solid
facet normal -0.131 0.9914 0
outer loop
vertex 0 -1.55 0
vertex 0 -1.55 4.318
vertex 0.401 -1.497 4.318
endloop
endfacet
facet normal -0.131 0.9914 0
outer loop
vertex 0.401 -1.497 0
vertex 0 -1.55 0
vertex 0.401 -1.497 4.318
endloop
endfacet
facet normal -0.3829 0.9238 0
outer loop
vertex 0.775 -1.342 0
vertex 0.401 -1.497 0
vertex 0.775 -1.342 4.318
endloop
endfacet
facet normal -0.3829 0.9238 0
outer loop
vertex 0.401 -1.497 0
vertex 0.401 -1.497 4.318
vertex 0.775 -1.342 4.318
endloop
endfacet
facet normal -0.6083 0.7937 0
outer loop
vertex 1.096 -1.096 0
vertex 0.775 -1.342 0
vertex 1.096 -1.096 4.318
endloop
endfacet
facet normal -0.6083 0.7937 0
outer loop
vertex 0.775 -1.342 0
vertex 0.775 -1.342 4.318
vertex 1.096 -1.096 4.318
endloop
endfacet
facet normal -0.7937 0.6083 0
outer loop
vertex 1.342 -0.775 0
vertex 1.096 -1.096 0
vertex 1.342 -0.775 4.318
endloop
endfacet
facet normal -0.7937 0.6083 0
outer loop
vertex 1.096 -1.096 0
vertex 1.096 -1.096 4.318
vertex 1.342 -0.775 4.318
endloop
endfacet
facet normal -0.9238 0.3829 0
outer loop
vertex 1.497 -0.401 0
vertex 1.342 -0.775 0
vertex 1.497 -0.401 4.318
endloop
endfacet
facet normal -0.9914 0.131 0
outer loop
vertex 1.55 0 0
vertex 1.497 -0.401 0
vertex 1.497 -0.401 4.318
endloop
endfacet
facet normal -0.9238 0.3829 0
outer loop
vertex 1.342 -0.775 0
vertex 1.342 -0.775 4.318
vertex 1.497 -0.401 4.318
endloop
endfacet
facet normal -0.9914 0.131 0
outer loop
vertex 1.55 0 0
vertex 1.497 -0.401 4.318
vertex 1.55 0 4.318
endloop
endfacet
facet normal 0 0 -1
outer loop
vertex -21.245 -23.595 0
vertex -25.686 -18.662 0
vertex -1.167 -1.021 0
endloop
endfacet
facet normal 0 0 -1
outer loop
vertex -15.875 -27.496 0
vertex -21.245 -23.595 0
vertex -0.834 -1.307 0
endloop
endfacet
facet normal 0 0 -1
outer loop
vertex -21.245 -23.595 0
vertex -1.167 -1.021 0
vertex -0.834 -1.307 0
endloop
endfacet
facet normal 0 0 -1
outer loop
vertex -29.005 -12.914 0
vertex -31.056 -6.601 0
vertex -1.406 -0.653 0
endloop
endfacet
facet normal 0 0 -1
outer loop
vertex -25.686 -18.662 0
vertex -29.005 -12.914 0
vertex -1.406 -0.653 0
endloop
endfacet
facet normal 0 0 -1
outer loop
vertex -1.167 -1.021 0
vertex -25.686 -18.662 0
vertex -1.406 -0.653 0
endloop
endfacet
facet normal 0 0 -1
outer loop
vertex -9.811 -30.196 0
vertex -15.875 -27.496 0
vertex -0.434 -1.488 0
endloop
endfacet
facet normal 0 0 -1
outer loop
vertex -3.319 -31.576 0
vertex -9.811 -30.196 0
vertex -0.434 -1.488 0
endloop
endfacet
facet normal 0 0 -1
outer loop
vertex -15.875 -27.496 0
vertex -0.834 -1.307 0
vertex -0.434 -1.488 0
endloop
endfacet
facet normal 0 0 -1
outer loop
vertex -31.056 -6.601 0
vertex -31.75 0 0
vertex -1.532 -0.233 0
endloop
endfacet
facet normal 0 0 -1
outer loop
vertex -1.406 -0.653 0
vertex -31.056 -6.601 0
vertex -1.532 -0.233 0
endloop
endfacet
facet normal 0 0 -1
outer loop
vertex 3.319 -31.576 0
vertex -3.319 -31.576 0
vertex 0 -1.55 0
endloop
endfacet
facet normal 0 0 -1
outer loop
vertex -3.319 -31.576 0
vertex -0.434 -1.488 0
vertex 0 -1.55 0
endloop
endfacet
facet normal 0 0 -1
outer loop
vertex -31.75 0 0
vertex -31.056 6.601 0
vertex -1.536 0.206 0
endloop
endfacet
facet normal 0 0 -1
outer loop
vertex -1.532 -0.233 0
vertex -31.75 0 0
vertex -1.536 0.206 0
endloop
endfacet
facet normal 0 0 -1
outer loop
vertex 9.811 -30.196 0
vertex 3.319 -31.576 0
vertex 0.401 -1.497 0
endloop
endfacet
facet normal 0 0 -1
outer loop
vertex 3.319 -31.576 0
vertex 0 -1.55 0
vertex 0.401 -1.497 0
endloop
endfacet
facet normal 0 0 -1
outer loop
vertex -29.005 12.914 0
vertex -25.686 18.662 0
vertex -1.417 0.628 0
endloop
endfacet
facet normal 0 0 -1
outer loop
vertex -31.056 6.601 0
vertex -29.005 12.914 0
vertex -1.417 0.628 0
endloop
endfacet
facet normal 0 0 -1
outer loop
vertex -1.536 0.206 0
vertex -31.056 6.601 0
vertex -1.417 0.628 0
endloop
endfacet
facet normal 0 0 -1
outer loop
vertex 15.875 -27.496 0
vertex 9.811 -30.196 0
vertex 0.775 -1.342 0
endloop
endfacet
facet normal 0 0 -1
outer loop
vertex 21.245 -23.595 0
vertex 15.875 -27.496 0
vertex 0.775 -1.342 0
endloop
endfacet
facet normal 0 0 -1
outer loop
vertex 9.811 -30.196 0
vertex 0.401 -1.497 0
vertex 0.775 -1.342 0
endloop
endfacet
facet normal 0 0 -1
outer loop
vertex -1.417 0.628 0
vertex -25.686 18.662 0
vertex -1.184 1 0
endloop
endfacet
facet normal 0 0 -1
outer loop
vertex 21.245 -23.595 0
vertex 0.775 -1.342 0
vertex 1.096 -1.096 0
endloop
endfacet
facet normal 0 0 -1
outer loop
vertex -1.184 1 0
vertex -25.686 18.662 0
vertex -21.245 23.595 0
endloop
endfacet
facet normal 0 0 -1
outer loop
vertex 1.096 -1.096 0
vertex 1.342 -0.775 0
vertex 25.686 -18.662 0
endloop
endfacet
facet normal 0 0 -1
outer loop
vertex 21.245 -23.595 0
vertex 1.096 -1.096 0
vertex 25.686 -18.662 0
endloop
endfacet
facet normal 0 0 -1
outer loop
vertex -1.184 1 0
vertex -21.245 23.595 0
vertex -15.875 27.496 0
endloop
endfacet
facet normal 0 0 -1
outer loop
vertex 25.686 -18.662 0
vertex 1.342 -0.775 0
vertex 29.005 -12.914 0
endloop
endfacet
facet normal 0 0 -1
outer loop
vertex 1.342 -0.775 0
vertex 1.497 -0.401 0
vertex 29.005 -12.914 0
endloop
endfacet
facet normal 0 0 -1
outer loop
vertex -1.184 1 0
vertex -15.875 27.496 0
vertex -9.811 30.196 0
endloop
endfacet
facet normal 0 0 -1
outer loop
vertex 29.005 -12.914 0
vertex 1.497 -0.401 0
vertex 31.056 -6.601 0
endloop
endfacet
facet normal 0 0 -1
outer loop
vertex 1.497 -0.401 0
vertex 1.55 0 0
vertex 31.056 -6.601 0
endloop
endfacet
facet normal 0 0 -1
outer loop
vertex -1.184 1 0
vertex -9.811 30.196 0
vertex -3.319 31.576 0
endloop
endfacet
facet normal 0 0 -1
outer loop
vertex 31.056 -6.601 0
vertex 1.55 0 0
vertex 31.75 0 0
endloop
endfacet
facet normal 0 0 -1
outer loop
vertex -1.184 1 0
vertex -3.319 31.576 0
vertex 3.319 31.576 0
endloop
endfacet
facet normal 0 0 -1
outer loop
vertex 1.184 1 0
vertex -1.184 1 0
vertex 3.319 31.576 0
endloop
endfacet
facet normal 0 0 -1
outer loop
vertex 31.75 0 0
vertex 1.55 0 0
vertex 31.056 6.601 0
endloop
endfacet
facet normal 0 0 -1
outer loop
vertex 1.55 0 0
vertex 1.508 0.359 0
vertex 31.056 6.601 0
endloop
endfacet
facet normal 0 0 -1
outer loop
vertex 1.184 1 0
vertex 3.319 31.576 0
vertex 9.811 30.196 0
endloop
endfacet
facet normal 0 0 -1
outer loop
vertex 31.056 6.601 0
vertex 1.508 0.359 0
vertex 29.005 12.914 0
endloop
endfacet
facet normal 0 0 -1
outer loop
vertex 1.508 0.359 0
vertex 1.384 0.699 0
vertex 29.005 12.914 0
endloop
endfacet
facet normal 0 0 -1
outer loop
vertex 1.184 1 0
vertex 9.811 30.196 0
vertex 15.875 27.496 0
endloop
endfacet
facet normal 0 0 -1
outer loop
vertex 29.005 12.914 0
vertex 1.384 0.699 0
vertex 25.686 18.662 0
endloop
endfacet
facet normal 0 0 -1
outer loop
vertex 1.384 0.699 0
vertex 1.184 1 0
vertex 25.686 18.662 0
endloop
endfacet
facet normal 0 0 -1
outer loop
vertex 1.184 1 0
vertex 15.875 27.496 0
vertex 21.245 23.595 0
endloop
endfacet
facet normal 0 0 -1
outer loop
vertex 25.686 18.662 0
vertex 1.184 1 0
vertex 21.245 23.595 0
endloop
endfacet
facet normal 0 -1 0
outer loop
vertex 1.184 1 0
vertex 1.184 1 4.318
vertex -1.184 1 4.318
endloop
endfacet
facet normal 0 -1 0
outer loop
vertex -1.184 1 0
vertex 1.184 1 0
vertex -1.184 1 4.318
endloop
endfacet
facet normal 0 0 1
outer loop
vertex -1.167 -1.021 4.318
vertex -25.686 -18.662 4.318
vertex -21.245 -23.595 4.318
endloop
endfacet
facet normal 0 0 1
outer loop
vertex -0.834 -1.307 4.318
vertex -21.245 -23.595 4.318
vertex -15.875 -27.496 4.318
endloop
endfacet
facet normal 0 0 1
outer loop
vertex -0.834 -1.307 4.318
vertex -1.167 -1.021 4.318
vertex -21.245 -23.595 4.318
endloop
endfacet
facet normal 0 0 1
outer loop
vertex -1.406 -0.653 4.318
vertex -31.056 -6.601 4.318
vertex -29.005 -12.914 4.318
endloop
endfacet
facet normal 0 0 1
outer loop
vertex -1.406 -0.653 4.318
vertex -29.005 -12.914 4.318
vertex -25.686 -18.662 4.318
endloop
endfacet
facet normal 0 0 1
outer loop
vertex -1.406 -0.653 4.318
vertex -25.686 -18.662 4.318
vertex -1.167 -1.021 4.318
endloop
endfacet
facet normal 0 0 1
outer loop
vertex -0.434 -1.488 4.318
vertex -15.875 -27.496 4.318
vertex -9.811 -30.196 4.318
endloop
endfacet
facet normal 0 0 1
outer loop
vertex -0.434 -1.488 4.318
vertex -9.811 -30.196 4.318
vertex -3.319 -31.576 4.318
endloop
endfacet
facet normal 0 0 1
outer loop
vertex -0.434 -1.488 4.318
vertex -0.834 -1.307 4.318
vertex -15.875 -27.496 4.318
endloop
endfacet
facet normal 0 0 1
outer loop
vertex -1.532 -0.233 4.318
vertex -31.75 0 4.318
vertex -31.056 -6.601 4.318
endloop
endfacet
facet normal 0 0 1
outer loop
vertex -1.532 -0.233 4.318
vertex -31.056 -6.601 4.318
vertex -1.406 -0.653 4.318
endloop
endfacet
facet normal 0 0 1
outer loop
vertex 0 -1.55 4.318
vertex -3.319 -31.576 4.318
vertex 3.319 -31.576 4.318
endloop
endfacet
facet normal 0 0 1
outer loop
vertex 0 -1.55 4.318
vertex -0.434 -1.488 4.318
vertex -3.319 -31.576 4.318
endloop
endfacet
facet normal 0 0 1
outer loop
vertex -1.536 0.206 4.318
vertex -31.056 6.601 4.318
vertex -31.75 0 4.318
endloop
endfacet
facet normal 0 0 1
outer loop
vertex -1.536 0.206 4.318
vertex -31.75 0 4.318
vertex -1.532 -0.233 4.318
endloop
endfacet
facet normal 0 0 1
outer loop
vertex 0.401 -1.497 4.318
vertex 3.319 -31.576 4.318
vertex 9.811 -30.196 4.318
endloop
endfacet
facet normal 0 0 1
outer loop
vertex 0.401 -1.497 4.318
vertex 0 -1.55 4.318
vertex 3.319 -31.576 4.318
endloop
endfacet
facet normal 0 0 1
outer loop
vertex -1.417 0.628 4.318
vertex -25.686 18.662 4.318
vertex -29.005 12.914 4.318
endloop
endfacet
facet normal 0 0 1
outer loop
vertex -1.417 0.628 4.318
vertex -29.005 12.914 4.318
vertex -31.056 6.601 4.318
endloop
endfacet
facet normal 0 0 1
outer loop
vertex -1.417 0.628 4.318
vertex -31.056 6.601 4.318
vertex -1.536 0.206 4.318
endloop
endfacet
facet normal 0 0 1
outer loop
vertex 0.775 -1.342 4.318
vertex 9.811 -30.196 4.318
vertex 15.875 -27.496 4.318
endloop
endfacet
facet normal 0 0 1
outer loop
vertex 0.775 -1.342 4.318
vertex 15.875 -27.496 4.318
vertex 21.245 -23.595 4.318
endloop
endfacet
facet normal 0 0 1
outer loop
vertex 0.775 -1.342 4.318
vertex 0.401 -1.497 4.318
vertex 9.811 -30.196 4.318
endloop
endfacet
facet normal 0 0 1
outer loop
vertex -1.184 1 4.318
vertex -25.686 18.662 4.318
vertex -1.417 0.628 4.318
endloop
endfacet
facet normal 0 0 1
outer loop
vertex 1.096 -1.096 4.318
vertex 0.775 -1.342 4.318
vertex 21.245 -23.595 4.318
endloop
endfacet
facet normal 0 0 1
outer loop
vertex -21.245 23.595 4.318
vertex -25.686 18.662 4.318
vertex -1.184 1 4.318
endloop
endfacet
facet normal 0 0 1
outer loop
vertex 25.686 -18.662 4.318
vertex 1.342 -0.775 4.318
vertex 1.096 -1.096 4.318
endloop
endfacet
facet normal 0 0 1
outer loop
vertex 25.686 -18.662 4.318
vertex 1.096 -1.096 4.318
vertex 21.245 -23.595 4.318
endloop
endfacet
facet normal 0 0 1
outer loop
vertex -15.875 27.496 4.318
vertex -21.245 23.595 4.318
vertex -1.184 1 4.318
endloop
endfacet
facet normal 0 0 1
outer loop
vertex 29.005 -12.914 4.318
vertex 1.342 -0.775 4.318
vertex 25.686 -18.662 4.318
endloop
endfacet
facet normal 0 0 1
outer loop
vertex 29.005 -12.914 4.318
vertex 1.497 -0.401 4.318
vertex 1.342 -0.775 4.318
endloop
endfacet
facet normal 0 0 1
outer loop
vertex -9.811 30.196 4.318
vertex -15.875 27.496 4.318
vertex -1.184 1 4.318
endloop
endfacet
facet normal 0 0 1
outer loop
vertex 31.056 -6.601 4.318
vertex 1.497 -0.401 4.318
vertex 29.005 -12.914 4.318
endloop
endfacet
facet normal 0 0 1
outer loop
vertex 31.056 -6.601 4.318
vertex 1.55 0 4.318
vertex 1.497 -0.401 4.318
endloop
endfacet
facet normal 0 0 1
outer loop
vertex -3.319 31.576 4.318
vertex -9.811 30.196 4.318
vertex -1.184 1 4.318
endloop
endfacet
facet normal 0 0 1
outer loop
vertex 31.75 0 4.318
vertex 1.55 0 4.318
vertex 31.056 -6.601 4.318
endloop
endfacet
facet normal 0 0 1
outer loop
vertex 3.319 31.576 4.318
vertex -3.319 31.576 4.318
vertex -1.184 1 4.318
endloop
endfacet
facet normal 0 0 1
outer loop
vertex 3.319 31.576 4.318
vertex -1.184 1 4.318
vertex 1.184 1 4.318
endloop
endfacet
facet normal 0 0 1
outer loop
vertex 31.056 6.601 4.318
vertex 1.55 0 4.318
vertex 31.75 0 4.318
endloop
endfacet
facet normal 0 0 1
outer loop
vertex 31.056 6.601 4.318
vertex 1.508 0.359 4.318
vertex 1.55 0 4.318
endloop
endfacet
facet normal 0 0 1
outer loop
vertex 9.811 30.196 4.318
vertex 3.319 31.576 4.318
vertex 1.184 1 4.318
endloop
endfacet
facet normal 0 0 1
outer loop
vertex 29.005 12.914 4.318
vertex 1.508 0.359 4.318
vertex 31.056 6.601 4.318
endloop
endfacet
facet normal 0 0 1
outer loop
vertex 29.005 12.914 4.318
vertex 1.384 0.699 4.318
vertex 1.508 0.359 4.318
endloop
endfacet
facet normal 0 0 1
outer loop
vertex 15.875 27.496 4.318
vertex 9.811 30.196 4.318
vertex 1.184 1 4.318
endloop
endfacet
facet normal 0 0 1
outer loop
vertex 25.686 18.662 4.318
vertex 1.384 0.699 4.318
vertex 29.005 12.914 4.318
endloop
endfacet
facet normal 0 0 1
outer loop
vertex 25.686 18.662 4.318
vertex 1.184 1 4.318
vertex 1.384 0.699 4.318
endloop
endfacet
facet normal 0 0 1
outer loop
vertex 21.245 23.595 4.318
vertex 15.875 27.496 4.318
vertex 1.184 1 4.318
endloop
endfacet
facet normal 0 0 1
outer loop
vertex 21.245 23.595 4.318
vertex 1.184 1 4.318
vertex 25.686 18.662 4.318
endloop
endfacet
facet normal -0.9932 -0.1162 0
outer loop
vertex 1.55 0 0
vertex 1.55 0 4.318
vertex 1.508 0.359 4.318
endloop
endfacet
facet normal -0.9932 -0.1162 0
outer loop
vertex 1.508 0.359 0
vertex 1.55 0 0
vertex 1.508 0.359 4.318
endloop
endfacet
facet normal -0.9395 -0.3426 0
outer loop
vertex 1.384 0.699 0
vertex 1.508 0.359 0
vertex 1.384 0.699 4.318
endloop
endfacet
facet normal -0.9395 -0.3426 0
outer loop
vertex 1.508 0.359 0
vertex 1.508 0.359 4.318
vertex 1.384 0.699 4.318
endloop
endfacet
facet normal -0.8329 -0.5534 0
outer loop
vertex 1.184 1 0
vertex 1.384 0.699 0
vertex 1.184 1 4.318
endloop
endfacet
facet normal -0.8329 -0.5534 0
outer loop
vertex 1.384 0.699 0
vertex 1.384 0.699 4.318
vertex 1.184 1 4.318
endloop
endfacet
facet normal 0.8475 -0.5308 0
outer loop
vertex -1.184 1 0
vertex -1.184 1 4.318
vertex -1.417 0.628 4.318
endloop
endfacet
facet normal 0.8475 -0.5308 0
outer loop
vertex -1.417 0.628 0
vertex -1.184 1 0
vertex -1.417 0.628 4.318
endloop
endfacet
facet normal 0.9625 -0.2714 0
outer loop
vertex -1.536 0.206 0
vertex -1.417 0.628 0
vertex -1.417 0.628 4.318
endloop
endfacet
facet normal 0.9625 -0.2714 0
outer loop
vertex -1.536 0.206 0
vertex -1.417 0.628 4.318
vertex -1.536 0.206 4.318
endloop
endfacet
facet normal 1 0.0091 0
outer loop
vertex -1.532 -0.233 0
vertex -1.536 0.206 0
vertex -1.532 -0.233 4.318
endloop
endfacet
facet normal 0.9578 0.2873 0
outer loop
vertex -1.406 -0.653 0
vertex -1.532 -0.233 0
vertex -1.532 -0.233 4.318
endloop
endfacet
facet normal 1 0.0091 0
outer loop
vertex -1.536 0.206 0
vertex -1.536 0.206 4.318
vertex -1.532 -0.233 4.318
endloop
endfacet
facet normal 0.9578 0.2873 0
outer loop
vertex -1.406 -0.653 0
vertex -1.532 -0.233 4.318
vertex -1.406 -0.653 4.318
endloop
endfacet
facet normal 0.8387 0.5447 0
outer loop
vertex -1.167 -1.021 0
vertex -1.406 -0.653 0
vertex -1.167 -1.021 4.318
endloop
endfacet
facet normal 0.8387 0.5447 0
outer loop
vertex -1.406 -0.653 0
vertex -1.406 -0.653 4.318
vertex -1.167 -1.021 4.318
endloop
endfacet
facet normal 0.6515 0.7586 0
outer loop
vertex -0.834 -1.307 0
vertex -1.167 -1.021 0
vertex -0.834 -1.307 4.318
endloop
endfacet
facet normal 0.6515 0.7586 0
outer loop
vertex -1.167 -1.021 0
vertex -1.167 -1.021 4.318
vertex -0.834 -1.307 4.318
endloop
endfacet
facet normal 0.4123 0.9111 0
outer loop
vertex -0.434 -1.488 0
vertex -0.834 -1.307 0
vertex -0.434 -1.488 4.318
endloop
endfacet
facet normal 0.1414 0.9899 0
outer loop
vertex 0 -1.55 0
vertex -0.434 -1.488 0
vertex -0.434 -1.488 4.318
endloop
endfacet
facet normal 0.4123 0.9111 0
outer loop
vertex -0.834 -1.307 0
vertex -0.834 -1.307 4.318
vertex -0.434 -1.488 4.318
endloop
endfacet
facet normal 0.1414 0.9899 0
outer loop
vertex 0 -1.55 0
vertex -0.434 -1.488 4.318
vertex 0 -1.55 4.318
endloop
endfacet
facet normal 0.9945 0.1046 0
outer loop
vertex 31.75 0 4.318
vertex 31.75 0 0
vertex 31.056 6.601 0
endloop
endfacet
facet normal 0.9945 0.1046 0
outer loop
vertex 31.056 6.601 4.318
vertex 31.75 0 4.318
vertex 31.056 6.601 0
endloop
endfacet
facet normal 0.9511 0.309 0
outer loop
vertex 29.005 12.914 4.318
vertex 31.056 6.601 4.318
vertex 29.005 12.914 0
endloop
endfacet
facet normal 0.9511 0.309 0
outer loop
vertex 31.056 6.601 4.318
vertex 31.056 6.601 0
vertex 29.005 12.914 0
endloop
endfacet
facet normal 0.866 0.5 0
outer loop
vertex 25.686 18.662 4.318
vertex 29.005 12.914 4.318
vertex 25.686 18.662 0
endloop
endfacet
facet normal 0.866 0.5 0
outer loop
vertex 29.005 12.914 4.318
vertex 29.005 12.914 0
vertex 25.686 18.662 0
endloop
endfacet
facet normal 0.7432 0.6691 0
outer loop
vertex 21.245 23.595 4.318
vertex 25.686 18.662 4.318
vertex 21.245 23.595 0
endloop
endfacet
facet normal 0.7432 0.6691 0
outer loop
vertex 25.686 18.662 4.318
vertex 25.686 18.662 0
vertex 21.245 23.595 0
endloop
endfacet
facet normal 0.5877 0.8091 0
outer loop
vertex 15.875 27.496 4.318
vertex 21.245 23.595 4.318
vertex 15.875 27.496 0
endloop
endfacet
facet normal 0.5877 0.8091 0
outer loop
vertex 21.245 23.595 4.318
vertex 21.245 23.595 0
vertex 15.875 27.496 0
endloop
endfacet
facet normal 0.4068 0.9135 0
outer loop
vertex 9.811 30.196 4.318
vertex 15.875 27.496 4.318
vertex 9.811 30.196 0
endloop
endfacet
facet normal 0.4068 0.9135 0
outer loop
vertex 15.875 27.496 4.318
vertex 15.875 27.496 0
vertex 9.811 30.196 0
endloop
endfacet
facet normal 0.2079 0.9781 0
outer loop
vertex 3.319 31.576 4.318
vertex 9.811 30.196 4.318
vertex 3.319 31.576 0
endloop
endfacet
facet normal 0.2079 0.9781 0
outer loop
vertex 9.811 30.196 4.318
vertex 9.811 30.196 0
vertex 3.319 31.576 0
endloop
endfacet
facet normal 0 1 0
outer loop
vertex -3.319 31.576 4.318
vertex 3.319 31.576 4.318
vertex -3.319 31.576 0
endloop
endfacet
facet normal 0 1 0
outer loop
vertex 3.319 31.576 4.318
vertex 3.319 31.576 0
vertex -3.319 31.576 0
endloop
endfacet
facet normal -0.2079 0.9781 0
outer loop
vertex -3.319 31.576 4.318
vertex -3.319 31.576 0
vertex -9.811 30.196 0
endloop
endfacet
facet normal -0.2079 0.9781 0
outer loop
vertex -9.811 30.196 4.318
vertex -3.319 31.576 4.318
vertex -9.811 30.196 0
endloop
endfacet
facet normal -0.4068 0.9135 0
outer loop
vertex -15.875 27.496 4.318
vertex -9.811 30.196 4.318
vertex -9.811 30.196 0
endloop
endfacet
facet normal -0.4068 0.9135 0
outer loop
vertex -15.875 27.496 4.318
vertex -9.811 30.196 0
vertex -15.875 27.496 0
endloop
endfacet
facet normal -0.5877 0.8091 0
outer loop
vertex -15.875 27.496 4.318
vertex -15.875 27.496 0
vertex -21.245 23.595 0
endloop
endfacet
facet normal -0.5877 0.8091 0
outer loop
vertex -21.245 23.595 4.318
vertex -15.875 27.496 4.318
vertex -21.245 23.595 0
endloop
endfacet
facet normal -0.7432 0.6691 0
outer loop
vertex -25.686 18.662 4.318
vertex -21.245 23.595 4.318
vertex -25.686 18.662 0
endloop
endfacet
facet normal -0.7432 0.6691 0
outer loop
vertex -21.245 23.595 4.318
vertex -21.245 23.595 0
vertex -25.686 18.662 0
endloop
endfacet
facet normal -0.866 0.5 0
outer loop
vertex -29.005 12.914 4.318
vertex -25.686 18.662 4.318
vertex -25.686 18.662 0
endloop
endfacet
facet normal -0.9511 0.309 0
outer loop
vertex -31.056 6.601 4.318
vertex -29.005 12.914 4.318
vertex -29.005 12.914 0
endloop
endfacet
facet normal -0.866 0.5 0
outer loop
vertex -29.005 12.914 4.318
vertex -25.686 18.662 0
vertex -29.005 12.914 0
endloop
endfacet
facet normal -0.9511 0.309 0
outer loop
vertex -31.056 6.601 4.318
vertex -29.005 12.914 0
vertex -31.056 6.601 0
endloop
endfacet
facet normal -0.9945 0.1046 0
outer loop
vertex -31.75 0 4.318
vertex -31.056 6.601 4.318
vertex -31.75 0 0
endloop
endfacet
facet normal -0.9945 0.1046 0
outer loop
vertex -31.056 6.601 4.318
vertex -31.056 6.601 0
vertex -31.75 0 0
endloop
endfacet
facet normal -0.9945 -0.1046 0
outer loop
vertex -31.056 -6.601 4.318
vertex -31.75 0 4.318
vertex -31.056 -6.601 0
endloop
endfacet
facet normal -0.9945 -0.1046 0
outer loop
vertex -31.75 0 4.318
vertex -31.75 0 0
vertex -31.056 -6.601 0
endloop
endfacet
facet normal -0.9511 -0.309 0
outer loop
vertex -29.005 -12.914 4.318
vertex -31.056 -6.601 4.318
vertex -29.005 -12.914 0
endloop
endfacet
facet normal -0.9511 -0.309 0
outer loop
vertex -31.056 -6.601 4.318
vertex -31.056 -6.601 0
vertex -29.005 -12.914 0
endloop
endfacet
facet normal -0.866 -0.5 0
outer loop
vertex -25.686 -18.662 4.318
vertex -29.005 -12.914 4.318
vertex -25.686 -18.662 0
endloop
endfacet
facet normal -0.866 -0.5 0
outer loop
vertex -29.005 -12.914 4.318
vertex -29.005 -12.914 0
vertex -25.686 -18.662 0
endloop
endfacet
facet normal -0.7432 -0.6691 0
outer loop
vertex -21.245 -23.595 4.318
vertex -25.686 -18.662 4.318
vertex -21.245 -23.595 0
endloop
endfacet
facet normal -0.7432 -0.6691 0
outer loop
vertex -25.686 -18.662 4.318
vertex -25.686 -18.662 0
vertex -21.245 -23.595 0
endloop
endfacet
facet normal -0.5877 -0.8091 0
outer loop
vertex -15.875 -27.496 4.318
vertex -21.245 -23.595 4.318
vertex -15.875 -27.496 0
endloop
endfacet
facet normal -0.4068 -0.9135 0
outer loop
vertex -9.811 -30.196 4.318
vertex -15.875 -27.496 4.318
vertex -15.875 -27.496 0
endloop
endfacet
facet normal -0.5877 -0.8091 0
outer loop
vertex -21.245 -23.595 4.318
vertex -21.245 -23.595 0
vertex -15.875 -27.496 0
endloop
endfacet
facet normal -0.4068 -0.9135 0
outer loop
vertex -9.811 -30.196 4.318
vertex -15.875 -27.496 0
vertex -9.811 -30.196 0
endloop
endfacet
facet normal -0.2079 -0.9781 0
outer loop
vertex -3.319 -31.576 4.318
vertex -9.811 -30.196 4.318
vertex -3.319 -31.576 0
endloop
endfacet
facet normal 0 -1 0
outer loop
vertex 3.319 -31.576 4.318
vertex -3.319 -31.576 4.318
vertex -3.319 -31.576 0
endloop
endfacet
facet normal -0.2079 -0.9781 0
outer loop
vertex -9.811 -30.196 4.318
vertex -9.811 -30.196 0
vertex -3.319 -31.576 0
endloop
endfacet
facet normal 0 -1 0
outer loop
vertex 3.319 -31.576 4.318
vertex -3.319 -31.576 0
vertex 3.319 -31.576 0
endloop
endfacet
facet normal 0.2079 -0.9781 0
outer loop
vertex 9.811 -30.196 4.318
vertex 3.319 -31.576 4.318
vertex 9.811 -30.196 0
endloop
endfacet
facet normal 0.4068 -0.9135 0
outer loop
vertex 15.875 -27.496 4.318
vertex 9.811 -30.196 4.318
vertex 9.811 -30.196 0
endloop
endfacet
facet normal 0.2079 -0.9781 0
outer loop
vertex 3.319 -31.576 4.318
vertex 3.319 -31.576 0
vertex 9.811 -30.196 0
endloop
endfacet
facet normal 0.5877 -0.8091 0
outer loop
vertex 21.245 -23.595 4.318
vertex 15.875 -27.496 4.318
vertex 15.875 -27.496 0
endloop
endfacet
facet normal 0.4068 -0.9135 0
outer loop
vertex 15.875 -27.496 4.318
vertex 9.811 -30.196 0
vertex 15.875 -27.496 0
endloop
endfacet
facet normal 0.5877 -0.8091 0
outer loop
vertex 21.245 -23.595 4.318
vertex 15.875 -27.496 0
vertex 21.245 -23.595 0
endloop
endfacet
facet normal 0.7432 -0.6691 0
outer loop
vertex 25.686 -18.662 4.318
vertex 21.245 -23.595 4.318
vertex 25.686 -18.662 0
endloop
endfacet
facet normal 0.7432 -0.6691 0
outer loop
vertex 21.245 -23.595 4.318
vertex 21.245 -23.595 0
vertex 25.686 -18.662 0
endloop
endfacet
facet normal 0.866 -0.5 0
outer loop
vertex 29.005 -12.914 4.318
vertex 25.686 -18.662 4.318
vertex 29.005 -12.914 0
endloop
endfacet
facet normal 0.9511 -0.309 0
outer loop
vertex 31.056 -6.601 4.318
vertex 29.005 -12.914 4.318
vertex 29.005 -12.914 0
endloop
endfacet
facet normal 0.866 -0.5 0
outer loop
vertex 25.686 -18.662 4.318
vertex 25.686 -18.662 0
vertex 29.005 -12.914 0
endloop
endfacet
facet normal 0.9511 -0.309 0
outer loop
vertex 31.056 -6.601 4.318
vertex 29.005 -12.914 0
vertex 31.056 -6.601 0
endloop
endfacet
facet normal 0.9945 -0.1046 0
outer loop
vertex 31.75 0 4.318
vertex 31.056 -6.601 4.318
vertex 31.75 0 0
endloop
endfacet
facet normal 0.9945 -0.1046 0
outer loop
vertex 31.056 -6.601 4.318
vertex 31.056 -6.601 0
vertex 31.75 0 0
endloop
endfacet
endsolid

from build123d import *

# Parameters (mm, degrees)
F0_R     = 31.75
F1_DEPTH = 4.318
F3_DEPTH = 4.318


with BuildPart() as f1:
    # F0 (on Top) → F1 (new body)
    with BuildSketch(Plane.XY):
        Circle(F0_R)
    extrude(amount=F1_DEPTH)

    # F2 (on face) → F3 (cut, through all)
    with BuildSketch(Plane.XY.offset(4.318)):
        with BuildLine():
            ThreePointArc((0, -1.55), (1.096016, -1.096016), (1.55, 0))
            ThreePointArc((1.55, 0), (1.455699, 0.53239), (1.184272, 1))
            Line((1.184272, 1), (0, 1))
            Line((0, 1), (0, -1.55))
        make_face()
        with BuildLine():
            ThreePointArc((-1.184272, 1), (-1.405792, -0.652878), (0, -1.55))
            Line((0, -1.55), (0, 1))
            Line((0, 1), (-1.184272, 1))
        make_face()
    extrude(amount=-F3_DEPTH, mode=Mode.SUBTRACT)


solid = f1.part
